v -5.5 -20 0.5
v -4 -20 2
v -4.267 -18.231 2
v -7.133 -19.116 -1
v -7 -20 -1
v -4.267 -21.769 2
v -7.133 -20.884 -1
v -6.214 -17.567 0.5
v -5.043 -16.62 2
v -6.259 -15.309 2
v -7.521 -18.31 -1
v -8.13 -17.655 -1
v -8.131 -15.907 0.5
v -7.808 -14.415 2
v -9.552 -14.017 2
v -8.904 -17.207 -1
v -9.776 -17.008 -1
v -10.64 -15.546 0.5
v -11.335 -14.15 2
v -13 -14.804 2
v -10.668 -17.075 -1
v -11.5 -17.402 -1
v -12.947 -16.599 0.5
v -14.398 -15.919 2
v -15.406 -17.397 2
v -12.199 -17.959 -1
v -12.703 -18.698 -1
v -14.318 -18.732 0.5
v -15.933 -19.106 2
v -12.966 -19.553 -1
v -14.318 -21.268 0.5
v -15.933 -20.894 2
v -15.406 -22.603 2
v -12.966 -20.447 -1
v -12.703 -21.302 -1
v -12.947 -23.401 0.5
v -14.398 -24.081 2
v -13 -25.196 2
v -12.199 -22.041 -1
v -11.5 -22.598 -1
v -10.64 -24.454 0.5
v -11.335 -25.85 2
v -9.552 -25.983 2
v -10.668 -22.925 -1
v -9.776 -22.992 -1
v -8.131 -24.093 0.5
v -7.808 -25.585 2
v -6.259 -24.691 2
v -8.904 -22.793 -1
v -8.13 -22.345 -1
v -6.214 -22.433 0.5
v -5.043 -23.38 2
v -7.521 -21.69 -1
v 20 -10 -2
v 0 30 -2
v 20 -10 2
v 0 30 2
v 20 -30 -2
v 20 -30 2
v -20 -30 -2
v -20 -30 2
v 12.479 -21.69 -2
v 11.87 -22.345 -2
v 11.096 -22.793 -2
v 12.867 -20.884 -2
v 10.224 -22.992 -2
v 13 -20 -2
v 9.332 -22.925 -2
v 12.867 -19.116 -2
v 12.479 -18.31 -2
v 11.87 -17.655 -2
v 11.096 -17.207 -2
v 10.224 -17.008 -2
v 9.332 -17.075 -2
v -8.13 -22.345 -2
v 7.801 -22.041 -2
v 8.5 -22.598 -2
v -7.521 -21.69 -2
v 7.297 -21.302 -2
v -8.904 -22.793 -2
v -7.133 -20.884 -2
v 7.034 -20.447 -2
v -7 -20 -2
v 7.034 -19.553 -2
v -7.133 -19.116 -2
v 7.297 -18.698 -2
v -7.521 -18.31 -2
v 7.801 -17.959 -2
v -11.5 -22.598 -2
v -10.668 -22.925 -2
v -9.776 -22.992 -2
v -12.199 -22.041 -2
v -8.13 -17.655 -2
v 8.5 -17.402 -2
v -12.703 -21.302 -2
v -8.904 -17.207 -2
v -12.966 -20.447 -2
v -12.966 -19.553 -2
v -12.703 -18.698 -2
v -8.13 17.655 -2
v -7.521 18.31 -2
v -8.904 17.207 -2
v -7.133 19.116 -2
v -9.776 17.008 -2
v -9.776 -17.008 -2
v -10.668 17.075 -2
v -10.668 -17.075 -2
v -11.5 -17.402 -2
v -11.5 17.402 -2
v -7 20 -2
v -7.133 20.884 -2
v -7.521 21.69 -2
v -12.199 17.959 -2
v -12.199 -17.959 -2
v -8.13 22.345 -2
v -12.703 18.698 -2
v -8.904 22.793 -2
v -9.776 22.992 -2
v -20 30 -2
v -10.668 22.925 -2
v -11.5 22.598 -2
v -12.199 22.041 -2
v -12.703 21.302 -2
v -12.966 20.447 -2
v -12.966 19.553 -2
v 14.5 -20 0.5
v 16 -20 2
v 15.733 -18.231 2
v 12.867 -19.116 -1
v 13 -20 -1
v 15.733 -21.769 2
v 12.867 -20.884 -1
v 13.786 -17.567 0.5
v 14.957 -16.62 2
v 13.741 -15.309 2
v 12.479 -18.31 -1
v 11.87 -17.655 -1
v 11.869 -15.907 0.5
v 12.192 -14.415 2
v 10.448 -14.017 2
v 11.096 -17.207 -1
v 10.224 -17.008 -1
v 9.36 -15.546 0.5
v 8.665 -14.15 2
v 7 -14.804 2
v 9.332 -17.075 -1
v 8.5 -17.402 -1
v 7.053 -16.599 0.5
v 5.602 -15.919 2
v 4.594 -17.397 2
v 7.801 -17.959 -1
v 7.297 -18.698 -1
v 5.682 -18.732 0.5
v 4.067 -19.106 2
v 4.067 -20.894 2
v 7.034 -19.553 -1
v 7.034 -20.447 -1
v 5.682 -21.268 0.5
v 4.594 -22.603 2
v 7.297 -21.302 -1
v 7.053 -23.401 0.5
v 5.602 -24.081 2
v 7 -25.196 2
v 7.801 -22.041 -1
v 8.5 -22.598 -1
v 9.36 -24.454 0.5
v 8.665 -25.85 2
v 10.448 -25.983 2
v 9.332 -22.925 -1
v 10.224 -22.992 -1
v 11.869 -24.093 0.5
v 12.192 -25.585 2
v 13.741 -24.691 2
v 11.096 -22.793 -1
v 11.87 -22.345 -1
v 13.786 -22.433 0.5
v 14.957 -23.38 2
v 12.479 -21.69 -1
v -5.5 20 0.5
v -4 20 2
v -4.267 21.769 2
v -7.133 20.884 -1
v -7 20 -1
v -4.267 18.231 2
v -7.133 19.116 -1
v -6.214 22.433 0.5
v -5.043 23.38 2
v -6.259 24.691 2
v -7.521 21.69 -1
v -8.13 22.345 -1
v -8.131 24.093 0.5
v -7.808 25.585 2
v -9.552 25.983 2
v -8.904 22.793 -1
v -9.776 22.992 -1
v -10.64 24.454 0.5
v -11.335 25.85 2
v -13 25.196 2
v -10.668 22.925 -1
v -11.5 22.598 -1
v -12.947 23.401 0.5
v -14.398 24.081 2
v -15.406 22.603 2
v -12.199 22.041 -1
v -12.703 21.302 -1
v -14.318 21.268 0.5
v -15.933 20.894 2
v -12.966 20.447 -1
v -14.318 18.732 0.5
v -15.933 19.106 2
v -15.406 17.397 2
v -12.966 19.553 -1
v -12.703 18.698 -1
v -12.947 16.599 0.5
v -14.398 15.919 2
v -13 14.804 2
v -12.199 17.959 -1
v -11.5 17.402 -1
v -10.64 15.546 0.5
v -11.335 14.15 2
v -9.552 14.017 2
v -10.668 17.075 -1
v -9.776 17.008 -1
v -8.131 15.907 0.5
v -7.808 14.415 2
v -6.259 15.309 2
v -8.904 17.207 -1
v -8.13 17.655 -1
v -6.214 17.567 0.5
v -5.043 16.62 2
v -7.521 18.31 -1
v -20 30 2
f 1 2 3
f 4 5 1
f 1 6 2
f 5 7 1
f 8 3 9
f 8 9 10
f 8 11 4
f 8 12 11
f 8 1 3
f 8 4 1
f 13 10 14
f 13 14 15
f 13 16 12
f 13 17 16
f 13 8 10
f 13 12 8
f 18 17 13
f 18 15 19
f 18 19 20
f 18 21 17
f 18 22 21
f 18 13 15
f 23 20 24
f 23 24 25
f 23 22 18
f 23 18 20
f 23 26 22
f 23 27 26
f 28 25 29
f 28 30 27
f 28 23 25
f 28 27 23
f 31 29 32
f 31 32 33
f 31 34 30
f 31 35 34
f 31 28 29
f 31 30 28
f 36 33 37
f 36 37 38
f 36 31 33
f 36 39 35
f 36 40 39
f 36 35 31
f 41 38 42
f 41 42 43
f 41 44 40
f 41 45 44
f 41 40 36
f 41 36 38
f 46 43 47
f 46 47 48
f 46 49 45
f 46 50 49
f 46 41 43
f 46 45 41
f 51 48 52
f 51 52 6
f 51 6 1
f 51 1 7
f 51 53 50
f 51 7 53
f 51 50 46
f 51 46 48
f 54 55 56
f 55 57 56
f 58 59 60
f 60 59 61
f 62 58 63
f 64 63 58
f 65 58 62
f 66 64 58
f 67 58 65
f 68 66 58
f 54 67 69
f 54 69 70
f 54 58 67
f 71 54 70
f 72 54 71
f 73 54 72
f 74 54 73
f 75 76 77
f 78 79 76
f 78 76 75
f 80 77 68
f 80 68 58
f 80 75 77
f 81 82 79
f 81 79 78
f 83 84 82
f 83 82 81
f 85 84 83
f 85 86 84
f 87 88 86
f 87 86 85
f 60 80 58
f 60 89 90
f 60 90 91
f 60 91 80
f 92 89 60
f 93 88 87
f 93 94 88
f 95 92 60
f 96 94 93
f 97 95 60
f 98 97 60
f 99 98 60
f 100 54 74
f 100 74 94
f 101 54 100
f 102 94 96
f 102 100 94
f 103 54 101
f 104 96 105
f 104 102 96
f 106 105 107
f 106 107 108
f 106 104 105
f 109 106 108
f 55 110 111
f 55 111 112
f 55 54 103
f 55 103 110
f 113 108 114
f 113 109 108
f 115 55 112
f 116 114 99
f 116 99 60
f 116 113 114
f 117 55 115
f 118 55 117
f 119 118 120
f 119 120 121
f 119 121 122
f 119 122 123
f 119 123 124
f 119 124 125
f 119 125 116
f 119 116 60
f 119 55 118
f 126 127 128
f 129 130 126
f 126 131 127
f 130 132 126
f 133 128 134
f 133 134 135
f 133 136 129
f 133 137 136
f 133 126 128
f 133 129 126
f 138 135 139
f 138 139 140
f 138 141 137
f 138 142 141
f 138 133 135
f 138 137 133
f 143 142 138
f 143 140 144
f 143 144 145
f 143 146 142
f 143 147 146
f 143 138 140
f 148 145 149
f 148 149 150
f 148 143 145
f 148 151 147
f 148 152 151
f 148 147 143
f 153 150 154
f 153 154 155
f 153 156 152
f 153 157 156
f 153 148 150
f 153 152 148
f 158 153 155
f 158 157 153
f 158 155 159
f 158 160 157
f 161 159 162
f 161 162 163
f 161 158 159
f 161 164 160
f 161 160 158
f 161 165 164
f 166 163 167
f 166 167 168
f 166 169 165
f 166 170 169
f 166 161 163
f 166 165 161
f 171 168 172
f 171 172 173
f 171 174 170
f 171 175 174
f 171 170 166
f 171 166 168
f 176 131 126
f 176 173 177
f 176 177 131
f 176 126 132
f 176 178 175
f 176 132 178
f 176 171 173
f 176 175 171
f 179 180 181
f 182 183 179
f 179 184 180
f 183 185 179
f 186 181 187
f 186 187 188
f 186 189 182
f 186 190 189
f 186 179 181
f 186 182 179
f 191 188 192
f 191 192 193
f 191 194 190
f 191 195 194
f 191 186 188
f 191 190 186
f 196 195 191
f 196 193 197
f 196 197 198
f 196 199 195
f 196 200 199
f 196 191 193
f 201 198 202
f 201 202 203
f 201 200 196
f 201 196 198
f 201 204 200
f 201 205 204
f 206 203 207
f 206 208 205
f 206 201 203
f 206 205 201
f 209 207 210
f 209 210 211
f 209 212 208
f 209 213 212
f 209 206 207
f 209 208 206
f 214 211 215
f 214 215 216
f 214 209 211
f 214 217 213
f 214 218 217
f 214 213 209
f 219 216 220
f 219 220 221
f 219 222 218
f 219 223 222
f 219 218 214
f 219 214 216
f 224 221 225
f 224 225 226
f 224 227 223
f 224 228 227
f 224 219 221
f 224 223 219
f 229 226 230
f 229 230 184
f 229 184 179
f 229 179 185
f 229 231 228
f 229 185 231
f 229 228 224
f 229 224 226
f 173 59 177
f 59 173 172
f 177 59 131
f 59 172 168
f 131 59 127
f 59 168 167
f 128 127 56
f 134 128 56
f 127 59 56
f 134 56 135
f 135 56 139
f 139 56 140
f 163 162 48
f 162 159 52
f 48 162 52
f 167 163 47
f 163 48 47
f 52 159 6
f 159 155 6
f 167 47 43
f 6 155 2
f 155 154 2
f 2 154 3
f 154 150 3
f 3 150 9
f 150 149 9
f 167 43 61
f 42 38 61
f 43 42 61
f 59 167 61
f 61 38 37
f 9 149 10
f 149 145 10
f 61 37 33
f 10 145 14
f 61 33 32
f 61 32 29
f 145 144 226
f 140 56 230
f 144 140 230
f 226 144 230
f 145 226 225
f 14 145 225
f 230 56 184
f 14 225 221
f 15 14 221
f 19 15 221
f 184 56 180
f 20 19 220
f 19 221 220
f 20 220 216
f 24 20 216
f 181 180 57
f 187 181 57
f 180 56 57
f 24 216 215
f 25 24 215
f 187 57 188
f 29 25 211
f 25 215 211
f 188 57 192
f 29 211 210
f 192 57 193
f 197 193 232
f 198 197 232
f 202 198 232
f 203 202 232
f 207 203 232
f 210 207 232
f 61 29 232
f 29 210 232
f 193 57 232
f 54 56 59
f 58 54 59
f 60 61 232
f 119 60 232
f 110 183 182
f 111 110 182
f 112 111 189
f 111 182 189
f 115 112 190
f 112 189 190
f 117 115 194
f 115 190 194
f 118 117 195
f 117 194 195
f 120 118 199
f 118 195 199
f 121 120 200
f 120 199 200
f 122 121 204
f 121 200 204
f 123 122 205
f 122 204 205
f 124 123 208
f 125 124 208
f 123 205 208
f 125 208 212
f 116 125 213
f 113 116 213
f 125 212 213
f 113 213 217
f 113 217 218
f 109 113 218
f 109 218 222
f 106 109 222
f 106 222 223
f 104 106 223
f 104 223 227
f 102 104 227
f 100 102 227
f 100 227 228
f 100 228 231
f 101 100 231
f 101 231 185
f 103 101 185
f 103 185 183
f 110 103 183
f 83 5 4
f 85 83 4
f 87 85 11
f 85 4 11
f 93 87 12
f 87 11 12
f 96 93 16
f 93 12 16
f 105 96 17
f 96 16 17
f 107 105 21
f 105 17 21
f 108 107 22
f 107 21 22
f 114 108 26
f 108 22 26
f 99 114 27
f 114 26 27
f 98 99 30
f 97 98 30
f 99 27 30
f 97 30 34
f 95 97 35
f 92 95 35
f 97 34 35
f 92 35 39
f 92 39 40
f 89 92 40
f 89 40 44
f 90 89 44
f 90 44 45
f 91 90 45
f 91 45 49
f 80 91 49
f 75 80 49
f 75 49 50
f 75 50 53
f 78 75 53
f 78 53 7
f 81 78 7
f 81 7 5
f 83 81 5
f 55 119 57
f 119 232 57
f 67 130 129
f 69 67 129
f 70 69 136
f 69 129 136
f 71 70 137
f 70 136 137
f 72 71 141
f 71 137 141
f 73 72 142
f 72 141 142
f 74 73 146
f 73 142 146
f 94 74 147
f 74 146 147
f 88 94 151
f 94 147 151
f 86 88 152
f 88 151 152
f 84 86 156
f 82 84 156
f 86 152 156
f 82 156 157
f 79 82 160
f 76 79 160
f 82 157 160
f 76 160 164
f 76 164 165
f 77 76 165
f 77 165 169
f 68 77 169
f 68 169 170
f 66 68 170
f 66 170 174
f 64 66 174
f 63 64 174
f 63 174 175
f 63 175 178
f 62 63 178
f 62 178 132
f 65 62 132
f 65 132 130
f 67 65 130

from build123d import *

# Parameters (mm, degrees)
BOSS_EXTRUDE1_DEPTH = 2
SKETCH2_R           = 3
CUT_EXTRUDE1_DEPTH  = 5
CHAMFER1_SIZE       = 3


with BuildPart() as part:
    # Sketch1 → Boss-Extrude1 (new body, symmetric)
    with BuildSketch(Plane.XY):
        Polygon((-20, -30), (-20, 30), (0, 30), (20, -10), (20, -30), align=None)
    extrude(amount=BOSS_EXTRUDE1_DEPTH, both=True)

    # Sketch2 → Cut-Extrude1 (cut, through all)
    with BuildSketch(Plane.XY.offset(2)):
        with Locations((-10, 20)):
            Circle(SKETCH2_R)
        with Locations((-10, -20)):
            Circle(SKETCH2_R)
        with Locations((10, -20)):
            Circle(SKETCH2_R)
    extrude(amount=-CUT_EXTRUDE1_DEPTH, mode=Mode.SUBTRACT)

    # Chamfer1
    chamfer1_edges = [part.edges().sort_by_distance(p)[0] for p in [
        (-13, 20, 2),
        (-13, -20, 2),
        (7, -20, 2),
    ]]
    chamfer(chamfer1_edges, length=CHAMFER1_SIZE)


solid = part.part
